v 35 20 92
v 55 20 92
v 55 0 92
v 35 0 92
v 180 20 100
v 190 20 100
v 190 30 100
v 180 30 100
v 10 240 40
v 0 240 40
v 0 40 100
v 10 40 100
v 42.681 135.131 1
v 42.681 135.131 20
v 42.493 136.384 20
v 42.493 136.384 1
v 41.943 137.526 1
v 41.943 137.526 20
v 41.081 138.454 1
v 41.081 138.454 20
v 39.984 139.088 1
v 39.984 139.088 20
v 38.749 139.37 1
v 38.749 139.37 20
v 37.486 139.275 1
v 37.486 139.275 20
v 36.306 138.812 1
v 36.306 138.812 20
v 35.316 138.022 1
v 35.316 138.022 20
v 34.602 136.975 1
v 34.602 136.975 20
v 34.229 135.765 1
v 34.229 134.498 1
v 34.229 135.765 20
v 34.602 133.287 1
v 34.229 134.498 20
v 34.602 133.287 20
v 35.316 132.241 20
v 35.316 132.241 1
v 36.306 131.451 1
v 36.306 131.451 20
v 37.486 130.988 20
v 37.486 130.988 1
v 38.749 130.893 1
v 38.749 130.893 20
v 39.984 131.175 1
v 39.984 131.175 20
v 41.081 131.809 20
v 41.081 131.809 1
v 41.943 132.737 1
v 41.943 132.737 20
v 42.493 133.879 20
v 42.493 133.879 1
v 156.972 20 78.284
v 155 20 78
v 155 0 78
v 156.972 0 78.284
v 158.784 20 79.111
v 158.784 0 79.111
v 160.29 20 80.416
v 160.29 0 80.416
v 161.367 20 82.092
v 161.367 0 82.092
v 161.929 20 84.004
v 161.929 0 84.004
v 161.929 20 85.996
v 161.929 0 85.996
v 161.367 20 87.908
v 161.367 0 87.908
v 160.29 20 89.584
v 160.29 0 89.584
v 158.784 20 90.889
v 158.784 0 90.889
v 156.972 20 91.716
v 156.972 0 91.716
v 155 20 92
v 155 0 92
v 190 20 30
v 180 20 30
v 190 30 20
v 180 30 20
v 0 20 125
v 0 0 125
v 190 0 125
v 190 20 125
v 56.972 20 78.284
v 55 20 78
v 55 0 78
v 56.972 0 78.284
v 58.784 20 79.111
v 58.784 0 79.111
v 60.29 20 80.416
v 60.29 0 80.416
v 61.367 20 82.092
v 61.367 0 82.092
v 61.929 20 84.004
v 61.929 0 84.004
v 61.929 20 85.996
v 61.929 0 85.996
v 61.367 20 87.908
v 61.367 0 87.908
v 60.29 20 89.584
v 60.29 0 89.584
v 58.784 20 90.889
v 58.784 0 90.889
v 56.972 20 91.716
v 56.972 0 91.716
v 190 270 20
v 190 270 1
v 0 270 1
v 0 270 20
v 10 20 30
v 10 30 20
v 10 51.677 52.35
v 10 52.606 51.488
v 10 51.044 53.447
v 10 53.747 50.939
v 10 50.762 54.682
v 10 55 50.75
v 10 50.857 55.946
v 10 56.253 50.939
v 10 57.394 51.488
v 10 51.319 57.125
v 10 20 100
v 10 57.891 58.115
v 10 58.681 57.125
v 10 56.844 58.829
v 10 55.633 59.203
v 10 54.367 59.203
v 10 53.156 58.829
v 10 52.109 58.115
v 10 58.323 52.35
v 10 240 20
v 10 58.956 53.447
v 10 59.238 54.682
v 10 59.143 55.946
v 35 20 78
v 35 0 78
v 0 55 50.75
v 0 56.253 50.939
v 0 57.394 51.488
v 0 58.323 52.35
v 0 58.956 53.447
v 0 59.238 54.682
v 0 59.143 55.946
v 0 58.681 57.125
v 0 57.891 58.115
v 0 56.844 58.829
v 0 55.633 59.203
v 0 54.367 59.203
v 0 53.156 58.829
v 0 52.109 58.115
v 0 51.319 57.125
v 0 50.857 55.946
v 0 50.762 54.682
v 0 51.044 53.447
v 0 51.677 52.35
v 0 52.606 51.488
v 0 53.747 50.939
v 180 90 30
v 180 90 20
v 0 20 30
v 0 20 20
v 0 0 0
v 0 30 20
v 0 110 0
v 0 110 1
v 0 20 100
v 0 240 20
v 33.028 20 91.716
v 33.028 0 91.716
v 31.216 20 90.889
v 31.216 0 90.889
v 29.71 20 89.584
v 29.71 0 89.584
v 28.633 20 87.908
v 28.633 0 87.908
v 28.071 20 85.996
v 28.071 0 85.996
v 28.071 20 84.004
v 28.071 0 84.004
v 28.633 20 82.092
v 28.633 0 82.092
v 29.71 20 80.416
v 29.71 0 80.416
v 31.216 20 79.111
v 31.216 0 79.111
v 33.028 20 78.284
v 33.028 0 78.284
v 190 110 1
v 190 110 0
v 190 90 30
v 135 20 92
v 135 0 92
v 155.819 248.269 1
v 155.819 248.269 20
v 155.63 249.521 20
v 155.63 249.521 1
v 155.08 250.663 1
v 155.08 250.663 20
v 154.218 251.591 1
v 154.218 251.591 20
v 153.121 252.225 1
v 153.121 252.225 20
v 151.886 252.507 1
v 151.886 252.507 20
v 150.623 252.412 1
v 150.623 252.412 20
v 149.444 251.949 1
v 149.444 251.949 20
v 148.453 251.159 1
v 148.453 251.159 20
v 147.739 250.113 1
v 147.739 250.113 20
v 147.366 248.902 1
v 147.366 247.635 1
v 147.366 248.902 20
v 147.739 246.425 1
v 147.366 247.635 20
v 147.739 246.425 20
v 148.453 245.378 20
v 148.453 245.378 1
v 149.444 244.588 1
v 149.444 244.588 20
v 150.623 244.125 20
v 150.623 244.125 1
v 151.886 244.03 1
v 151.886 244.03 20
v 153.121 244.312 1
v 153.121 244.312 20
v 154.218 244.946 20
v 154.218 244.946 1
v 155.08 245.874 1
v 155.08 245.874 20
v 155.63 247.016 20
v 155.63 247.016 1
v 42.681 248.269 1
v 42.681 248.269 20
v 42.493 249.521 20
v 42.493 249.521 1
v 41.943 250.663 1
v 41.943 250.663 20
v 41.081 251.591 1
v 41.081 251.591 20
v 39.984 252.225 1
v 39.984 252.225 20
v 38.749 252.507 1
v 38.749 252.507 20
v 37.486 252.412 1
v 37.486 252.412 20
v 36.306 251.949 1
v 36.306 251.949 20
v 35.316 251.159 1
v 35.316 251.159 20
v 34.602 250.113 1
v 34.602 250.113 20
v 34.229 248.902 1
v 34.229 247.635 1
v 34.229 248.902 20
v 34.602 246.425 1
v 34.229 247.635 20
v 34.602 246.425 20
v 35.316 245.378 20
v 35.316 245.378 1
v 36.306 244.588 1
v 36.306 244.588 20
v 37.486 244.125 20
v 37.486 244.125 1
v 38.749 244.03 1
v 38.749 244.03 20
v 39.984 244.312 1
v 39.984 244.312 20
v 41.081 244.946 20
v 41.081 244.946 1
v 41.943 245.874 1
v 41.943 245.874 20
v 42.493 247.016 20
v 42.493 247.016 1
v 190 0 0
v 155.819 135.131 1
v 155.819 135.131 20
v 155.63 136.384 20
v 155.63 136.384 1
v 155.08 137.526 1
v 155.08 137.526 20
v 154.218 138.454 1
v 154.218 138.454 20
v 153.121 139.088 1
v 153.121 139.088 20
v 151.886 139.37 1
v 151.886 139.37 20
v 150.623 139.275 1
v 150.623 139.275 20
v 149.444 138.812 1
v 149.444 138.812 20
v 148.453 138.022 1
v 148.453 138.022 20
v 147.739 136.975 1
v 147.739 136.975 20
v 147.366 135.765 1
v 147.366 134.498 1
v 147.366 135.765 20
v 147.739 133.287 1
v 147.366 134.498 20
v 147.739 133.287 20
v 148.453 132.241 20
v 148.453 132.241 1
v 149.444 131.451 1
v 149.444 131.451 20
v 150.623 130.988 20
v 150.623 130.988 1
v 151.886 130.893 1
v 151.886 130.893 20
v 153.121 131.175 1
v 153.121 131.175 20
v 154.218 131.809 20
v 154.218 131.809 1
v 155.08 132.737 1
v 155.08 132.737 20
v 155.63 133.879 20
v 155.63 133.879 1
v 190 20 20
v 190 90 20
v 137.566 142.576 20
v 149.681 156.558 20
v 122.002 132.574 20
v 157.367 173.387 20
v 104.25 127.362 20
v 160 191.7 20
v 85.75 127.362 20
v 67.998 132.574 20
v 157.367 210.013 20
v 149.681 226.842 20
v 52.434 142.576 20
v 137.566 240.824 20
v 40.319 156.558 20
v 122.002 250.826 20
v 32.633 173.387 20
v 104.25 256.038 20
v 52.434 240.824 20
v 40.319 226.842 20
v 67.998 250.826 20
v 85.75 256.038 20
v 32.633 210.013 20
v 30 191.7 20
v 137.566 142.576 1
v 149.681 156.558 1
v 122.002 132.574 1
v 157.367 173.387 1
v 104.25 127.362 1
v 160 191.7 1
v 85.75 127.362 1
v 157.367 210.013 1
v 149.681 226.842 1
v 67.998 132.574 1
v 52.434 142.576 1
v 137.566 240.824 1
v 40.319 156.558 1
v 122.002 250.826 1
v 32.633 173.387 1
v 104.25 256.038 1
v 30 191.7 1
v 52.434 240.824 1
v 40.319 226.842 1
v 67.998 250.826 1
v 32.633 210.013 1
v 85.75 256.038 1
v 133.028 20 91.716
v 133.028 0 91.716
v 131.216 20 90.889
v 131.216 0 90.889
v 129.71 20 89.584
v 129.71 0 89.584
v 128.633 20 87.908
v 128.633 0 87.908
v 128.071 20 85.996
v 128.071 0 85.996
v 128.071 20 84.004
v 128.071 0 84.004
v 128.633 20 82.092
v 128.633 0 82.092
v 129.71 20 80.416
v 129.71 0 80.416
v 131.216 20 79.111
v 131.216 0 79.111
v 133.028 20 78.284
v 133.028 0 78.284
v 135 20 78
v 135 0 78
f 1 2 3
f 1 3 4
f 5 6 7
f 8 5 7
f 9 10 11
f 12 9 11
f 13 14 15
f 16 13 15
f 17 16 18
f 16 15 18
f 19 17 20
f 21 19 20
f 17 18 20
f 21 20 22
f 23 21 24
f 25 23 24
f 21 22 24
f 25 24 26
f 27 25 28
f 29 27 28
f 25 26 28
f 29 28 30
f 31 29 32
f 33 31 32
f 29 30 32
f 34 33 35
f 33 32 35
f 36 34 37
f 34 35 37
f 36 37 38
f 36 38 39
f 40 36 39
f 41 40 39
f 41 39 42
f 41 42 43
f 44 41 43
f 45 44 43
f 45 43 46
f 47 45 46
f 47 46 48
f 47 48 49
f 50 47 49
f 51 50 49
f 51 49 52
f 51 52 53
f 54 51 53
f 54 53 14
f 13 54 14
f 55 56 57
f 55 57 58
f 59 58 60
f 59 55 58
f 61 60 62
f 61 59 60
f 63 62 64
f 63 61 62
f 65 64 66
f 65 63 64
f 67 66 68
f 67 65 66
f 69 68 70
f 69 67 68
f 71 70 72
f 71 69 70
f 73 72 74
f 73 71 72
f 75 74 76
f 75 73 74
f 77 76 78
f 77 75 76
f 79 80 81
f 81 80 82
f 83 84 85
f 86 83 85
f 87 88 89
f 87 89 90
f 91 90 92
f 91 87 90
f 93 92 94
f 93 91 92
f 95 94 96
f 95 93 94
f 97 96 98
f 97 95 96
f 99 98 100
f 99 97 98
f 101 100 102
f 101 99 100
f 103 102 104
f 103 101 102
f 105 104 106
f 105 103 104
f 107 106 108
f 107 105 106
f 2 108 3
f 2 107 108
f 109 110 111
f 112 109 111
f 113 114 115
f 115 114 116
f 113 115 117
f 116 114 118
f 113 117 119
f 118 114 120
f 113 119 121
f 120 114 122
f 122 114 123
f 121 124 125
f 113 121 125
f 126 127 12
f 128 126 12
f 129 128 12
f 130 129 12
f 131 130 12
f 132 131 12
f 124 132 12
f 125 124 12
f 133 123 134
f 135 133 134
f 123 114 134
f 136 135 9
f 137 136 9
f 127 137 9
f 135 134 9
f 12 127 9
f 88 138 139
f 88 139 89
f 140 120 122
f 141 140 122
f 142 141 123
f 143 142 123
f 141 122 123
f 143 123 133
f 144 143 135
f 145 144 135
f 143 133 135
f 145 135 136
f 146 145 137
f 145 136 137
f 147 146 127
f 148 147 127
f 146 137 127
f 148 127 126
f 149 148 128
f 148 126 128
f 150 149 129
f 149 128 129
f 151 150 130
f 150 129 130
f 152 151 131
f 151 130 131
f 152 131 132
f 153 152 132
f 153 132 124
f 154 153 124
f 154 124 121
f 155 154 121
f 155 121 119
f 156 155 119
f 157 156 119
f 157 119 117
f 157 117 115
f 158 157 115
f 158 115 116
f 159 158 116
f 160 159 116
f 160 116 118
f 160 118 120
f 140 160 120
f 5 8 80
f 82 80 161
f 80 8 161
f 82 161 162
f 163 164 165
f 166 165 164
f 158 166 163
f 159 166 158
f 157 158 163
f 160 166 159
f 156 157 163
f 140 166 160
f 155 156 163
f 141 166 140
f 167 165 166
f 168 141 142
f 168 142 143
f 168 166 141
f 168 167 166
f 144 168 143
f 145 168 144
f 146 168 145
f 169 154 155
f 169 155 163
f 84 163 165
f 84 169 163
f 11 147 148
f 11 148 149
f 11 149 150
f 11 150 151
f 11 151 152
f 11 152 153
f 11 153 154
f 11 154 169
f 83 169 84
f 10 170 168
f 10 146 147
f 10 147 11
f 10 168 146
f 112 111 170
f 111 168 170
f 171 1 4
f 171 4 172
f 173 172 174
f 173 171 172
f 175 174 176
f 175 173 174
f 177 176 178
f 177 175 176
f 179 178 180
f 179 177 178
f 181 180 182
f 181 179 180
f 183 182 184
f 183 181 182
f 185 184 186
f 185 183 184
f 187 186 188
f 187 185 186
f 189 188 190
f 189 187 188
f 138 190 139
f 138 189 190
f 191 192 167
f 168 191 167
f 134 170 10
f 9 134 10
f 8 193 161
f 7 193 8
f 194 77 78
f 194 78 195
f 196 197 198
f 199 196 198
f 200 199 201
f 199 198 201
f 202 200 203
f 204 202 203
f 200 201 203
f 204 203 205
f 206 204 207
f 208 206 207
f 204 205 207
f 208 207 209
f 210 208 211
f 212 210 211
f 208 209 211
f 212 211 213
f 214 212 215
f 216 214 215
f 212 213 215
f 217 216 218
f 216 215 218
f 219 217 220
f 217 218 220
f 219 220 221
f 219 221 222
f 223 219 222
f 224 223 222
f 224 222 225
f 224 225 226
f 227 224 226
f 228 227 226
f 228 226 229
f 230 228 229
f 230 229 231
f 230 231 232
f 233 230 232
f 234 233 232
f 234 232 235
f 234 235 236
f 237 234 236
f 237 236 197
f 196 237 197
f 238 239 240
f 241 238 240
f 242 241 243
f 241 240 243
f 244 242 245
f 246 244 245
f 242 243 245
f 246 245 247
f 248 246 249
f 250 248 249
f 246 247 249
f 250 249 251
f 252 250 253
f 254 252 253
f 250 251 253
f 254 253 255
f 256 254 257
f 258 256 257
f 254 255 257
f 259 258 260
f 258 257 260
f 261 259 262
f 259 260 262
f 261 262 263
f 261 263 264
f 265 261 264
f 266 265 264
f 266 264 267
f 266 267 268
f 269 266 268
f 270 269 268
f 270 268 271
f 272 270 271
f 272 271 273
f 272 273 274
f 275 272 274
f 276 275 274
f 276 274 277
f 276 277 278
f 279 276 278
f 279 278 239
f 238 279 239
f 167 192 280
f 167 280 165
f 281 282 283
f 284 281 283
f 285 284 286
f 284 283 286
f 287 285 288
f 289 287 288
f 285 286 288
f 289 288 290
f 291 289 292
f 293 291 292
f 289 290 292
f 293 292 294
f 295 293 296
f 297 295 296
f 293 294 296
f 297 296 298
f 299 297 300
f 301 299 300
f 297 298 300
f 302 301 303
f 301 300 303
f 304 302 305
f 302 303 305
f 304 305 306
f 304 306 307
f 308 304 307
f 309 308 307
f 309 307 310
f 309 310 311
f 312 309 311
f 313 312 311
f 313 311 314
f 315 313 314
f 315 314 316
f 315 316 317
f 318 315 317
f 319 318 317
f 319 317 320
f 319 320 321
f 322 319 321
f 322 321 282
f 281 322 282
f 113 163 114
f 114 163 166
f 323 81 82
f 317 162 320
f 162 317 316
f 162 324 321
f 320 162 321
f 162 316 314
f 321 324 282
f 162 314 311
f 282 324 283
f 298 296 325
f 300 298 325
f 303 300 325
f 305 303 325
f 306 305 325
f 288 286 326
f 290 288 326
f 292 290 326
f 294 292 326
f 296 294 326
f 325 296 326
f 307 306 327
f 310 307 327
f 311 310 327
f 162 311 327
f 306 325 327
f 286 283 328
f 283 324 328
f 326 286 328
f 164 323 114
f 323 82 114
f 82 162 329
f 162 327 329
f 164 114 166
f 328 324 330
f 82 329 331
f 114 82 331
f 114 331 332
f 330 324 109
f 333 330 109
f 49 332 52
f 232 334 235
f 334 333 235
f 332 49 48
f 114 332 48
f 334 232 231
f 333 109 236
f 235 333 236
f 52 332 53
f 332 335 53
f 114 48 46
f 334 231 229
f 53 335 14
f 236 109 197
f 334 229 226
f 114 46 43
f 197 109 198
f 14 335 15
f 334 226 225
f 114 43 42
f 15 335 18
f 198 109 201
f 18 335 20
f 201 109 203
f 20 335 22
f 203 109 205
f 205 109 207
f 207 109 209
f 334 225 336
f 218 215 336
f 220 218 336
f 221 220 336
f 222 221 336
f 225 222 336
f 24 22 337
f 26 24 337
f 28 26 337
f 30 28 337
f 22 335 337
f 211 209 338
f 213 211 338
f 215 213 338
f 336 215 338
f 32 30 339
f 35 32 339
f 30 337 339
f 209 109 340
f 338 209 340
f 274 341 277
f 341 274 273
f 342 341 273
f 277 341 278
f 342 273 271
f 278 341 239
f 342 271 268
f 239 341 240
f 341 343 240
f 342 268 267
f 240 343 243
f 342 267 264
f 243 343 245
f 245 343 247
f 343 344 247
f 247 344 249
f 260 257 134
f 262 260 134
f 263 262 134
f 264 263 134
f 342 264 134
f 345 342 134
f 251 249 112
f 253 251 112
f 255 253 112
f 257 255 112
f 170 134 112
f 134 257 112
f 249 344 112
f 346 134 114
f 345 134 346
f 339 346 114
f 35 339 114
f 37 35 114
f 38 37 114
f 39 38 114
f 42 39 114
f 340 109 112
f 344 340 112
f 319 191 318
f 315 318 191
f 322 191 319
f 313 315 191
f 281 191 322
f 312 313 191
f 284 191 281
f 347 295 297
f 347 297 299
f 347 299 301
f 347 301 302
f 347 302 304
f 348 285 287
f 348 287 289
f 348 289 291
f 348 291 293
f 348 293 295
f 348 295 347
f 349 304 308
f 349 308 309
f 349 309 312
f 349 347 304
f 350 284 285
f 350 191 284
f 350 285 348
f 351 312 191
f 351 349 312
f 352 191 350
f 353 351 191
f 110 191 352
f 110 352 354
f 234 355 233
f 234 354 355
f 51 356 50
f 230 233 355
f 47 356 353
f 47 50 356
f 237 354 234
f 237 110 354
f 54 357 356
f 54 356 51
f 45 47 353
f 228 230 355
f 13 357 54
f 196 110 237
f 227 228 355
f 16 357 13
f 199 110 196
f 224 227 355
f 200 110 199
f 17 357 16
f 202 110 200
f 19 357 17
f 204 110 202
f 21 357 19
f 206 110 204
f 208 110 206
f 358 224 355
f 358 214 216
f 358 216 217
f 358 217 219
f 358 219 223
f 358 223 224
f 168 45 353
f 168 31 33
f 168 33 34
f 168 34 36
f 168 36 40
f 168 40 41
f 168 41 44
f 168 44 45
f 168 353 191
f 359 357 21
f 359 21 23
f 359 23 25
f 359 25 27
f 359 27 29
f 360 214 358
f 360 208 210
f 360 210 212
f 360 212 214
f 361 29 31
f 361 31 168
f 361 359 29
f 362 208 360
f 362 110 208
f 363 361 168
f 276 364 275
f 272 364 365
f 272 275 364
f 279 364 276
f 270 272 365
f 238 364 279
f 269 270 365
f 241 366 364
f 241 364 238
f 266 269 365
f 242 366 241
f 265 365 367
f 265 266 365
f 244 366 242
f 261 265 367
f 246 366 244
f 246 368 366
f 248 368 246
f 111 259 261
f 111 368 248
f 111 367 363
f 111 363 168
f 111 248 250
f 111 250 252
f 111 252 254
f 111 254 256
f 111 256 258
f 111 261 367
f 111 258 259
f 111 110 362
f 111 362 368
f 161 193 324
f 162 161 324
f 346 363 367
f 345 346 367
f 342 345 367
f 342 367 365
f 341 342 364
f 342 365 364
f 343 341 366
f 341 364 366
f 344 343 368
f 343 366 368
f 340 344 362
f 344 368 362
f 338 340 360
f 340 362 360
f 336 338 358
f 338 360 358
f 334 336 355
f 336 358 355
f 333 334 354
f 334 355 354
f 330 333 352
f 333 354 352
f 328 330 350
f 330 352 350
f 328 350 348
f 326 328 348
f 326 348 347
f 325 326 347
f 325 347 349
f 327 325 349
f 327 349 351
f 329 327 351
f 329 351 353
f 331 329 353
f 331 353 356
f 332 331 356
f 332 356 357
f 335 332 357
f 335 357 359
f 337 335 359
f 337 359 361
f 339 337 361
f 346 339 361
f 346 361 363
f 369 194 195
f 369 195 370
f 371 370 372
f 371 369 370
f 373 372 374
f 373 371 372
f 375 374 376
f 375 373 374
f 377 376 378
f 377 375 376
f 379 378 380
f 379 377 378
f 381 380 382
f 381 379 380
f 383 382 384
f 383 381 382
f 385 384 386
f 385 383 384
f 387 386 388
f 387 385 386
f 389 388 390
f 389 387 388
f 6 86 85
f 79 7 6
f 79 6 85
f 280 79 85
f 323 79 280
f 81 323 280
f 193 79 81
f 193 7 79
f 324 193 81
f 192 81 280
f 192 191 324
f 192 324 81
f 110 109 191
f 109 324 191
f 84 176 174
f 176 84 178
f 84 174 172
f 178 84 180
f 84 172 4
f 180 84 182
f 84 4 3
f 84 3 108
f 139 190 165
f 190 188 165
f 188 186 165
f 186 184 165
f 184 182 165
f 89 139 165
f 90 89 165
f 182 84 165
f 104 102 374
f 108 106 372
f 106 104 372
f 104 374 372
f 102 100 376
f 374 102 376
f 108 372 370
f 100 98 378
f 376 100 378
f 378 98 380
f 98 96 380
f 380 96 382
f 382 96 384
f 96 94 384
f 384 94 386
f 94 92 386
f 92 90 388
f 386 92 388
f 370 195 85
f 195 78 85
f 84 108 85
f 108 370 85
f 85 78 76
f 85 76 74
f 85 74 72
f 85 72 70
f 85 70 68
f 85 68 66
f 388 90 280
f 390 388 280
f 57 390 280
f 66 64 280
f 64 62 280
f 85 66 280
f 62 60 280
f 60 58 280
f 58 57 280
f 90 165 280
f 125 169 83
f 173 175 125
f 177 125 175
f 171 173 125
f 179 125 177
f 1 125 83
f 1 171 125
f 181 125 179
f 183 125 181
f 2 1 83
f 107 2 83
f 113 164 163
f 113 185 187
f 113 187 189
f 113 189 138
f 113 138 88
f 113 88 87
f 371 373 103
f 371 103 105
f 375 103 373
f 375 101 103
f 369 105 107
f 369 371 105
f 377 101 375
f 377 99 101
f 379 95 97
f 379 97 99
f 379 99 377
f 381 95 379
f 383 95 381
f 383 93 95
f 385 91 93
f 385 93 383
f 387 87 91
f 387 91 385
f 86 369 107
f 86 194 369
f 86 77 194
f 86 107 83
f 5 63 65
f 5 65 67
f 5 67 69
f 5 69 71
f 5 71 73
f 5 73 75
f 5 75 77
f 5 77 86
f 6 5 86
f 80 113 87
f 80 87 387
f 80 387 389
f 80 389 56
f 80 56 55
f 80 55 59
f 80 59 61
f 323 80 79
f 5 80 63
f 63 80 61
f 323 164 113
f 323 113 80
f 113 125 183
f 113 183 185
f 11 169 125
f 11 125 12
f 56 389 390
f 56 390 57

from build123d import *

# Parameters (mm, degrees)
SKETCH1_W                  = 190
SKETCH1_H                  = 125
BOSS_EXTRUDE1_DEPTH        = 20
SKETCH2_W                  = 190
SKETCH2_H                  = 250
BOSS_EXTRUDE2_DEPTH        = 20
SKETCH3_W                  = 80
SKETCH3_H                  = 220
BOSS_EXTRUDE3_DEPTH        = 10
SKETCH4_W                  = 80
SKETCH4_H                  = 70
BOSS_EXTRUDE4_DEPTH        = 10
CUT_EXTRUDE1_DEPTH         = 354.022662162
CUT_EXTRUDE2_DEPTH         = 10
CUT_EXTRUDE3_DEPTH         = 10
SKETCH8_W                  = 190
SKETCH8_H                  = 160
CUT_EXTRUDE4_DEPTH         = 1
SKETCH9_R                  = 65
CUT_EXTRUDE5_DEPTH         = 353.669817251
CUT_EXTRUDE6_DEPTH         = 338.971892322
M10X1_5_TAPPED_HOLE1_D     = 8.5
M10X1_5_TAPPED_HOLE2_D     = 8.5
M10X1_5_TAPPED_HOLE2_DEPTH = 10


with BuildPart() as part:
    # Sketch1 → Boss-Extrude1 (new body)
    with BuildSketch(Plane(origin=(0, 0, 0), x_dir=(1, 0, 0), z_dir=(0, 1, 0))):
        with Locations((95, -62.5)):
            Rectangle(SKETCH1_W, SKETCH1_H)
    extrude(amount=BOSS_EXTRUDE1_DEPTH)

    # Sketch2 → Boss-Extrude2 (add)
    with BuildSketch(Plane(origin=(0, 0, 0), x_dir=(-1, 0, 0), z_dir=(0, 0, -1))):
        with Locations((-95, 145)):
            Rectangle(SKETCH2_W, SKETCH2_H)
    extrude(amount=-BOSS_EXTRUDE2_DEPTH)

    # Sketch3 → Boss-Extrude3 (add)
    with BuildSketch(Plane.ZY):
        with Locations((60, 130)):
            Rectangle(SKETCH3_W, SKETCH3_H)
    extrude(amount=-BOSS_EXTRUDE3_DEPTH)

    # Sketch4 → Boss-Extrude4 (add)
    with BuildSketch(Plane(origin=(190, 0, 0), x_dir=(0, 0, -1), z_dir=(1, 0, 0))):
        with Locations((-60, 55)):
            Rectangle(SKETCH4_W, SKETCH4_H)
    extrude(amount=-BOSS_EXTRUDE4_DEPTH)

    # Sketch5 → Cut-Extrude1 (cut, through all)
    with BuildSketch(Plane.ZY):
        Polygon((20, 30), (20, 20), (30, 20), align=None)
    extrude(amount=-CUT_EXTRUDE1_DEPTH, mode=Mode.SUBTRACT)

    # Sketch6 → Cut-Extrude2 (cut)
    with BuildSketch(Plane.ZY):
        Polygon((40, 240), (100, 40), (100, 240), align=None)
    extrude(amount=-CUT_EXTRUDE2_DEPTH, mode=Mode.SUBTRACT)

    # Sketch7 → Cut-Extrude3 (cut)
    with BuildSketch(Plane(origin=(190, 0, 0), x_dir=(0, 0, -1), z_dir=(1, 0, 0))):
        Polygon((-100, 90), (-30, 90), (-100, 30), align=None)
    extrude(amount=-CUT_EXTRUDE3_DEPTH, mode=Mode.SUBTRACT)

    # Sketch8 → Cut-Extrude4 (cut)
    with BuildSketch(Plane(origin=(0, 0, 0), x_dir=(-1, 0, 0), z_dir=(0, 0, -1))):
        with Locations((-95, 190)):
            Rectangle(SKETCH8_W, SKETCH8_H)
    extrude(amount=-CUT_EXTRUDE4_DEPTH, mode=Mode.SUBTRACT)

    # Sketch9 → Cut-Extrude5 (cut, through all)
    with BuildSketch(Plane(origin=(0, 0, 1), x_dir=(-1, 0, 0), z_dir=(0, 0, -1))):
        with Locations((-95, 191.7)):
            Circle(SKETCH9_R)
    extrude(amount=-CUT_EXTRUDE5_DEPTH, mode=Mode.SUBTRACT)

    # Sketch10 → Cut-Extrude6 (cut, through all)
    with BuildSketch(Plane(origin=(0, 20, 0), x_dir=(1, 0, 0), z_dir=(0, 1, 0))):
        with BuildLine():
            Line((35, -78), (55, -78))
            ThreePointArc((55, -78), (62, -85), (55, -92))
            Line((55, -92), (35, -92))
            ThreePointArc((35, -92), (28, -85), (35, -78))
        make_face()
        with BuildLine():
            Line((135, -78), (155, -78))
            ThreePointArc((155, -78), (162, -85), (155, -92))
            Line((155, -92), (135, -92))
            ThreePointArc((135, -92), (128, -85), (135, -78))
        make_face()
    extrude(amount=-CUT_EXTRUDE6_DEPTH, mode=Mode.SUBTRACT)

    # M10x1.5 Tapped Hole1 (through all)
    with Locations(Plane(origin=(0, 0, 1), x_dir=(-1, 0, 0), z_dir=(0, 0, -1))):
        with Locations((-38.431457505, 248.268542495), (-151.568542495, 248.268542495), (-151.568542495, 135.131457505), (-38.431457505, 135.131457505)):
            Hole(M10X1_5_TAPPED_HOLE1_D / 2)

    # M10x1.5 Tapped Hole2
    with Locations(Plane.ZY):
        with Locations((55, 55)):
            Hole(M10X1_5_TAPPED_HOLE2_D / 2, depth=M10X1_5_TAPPED_HOLE2_DEPTH)


solid = part.part
